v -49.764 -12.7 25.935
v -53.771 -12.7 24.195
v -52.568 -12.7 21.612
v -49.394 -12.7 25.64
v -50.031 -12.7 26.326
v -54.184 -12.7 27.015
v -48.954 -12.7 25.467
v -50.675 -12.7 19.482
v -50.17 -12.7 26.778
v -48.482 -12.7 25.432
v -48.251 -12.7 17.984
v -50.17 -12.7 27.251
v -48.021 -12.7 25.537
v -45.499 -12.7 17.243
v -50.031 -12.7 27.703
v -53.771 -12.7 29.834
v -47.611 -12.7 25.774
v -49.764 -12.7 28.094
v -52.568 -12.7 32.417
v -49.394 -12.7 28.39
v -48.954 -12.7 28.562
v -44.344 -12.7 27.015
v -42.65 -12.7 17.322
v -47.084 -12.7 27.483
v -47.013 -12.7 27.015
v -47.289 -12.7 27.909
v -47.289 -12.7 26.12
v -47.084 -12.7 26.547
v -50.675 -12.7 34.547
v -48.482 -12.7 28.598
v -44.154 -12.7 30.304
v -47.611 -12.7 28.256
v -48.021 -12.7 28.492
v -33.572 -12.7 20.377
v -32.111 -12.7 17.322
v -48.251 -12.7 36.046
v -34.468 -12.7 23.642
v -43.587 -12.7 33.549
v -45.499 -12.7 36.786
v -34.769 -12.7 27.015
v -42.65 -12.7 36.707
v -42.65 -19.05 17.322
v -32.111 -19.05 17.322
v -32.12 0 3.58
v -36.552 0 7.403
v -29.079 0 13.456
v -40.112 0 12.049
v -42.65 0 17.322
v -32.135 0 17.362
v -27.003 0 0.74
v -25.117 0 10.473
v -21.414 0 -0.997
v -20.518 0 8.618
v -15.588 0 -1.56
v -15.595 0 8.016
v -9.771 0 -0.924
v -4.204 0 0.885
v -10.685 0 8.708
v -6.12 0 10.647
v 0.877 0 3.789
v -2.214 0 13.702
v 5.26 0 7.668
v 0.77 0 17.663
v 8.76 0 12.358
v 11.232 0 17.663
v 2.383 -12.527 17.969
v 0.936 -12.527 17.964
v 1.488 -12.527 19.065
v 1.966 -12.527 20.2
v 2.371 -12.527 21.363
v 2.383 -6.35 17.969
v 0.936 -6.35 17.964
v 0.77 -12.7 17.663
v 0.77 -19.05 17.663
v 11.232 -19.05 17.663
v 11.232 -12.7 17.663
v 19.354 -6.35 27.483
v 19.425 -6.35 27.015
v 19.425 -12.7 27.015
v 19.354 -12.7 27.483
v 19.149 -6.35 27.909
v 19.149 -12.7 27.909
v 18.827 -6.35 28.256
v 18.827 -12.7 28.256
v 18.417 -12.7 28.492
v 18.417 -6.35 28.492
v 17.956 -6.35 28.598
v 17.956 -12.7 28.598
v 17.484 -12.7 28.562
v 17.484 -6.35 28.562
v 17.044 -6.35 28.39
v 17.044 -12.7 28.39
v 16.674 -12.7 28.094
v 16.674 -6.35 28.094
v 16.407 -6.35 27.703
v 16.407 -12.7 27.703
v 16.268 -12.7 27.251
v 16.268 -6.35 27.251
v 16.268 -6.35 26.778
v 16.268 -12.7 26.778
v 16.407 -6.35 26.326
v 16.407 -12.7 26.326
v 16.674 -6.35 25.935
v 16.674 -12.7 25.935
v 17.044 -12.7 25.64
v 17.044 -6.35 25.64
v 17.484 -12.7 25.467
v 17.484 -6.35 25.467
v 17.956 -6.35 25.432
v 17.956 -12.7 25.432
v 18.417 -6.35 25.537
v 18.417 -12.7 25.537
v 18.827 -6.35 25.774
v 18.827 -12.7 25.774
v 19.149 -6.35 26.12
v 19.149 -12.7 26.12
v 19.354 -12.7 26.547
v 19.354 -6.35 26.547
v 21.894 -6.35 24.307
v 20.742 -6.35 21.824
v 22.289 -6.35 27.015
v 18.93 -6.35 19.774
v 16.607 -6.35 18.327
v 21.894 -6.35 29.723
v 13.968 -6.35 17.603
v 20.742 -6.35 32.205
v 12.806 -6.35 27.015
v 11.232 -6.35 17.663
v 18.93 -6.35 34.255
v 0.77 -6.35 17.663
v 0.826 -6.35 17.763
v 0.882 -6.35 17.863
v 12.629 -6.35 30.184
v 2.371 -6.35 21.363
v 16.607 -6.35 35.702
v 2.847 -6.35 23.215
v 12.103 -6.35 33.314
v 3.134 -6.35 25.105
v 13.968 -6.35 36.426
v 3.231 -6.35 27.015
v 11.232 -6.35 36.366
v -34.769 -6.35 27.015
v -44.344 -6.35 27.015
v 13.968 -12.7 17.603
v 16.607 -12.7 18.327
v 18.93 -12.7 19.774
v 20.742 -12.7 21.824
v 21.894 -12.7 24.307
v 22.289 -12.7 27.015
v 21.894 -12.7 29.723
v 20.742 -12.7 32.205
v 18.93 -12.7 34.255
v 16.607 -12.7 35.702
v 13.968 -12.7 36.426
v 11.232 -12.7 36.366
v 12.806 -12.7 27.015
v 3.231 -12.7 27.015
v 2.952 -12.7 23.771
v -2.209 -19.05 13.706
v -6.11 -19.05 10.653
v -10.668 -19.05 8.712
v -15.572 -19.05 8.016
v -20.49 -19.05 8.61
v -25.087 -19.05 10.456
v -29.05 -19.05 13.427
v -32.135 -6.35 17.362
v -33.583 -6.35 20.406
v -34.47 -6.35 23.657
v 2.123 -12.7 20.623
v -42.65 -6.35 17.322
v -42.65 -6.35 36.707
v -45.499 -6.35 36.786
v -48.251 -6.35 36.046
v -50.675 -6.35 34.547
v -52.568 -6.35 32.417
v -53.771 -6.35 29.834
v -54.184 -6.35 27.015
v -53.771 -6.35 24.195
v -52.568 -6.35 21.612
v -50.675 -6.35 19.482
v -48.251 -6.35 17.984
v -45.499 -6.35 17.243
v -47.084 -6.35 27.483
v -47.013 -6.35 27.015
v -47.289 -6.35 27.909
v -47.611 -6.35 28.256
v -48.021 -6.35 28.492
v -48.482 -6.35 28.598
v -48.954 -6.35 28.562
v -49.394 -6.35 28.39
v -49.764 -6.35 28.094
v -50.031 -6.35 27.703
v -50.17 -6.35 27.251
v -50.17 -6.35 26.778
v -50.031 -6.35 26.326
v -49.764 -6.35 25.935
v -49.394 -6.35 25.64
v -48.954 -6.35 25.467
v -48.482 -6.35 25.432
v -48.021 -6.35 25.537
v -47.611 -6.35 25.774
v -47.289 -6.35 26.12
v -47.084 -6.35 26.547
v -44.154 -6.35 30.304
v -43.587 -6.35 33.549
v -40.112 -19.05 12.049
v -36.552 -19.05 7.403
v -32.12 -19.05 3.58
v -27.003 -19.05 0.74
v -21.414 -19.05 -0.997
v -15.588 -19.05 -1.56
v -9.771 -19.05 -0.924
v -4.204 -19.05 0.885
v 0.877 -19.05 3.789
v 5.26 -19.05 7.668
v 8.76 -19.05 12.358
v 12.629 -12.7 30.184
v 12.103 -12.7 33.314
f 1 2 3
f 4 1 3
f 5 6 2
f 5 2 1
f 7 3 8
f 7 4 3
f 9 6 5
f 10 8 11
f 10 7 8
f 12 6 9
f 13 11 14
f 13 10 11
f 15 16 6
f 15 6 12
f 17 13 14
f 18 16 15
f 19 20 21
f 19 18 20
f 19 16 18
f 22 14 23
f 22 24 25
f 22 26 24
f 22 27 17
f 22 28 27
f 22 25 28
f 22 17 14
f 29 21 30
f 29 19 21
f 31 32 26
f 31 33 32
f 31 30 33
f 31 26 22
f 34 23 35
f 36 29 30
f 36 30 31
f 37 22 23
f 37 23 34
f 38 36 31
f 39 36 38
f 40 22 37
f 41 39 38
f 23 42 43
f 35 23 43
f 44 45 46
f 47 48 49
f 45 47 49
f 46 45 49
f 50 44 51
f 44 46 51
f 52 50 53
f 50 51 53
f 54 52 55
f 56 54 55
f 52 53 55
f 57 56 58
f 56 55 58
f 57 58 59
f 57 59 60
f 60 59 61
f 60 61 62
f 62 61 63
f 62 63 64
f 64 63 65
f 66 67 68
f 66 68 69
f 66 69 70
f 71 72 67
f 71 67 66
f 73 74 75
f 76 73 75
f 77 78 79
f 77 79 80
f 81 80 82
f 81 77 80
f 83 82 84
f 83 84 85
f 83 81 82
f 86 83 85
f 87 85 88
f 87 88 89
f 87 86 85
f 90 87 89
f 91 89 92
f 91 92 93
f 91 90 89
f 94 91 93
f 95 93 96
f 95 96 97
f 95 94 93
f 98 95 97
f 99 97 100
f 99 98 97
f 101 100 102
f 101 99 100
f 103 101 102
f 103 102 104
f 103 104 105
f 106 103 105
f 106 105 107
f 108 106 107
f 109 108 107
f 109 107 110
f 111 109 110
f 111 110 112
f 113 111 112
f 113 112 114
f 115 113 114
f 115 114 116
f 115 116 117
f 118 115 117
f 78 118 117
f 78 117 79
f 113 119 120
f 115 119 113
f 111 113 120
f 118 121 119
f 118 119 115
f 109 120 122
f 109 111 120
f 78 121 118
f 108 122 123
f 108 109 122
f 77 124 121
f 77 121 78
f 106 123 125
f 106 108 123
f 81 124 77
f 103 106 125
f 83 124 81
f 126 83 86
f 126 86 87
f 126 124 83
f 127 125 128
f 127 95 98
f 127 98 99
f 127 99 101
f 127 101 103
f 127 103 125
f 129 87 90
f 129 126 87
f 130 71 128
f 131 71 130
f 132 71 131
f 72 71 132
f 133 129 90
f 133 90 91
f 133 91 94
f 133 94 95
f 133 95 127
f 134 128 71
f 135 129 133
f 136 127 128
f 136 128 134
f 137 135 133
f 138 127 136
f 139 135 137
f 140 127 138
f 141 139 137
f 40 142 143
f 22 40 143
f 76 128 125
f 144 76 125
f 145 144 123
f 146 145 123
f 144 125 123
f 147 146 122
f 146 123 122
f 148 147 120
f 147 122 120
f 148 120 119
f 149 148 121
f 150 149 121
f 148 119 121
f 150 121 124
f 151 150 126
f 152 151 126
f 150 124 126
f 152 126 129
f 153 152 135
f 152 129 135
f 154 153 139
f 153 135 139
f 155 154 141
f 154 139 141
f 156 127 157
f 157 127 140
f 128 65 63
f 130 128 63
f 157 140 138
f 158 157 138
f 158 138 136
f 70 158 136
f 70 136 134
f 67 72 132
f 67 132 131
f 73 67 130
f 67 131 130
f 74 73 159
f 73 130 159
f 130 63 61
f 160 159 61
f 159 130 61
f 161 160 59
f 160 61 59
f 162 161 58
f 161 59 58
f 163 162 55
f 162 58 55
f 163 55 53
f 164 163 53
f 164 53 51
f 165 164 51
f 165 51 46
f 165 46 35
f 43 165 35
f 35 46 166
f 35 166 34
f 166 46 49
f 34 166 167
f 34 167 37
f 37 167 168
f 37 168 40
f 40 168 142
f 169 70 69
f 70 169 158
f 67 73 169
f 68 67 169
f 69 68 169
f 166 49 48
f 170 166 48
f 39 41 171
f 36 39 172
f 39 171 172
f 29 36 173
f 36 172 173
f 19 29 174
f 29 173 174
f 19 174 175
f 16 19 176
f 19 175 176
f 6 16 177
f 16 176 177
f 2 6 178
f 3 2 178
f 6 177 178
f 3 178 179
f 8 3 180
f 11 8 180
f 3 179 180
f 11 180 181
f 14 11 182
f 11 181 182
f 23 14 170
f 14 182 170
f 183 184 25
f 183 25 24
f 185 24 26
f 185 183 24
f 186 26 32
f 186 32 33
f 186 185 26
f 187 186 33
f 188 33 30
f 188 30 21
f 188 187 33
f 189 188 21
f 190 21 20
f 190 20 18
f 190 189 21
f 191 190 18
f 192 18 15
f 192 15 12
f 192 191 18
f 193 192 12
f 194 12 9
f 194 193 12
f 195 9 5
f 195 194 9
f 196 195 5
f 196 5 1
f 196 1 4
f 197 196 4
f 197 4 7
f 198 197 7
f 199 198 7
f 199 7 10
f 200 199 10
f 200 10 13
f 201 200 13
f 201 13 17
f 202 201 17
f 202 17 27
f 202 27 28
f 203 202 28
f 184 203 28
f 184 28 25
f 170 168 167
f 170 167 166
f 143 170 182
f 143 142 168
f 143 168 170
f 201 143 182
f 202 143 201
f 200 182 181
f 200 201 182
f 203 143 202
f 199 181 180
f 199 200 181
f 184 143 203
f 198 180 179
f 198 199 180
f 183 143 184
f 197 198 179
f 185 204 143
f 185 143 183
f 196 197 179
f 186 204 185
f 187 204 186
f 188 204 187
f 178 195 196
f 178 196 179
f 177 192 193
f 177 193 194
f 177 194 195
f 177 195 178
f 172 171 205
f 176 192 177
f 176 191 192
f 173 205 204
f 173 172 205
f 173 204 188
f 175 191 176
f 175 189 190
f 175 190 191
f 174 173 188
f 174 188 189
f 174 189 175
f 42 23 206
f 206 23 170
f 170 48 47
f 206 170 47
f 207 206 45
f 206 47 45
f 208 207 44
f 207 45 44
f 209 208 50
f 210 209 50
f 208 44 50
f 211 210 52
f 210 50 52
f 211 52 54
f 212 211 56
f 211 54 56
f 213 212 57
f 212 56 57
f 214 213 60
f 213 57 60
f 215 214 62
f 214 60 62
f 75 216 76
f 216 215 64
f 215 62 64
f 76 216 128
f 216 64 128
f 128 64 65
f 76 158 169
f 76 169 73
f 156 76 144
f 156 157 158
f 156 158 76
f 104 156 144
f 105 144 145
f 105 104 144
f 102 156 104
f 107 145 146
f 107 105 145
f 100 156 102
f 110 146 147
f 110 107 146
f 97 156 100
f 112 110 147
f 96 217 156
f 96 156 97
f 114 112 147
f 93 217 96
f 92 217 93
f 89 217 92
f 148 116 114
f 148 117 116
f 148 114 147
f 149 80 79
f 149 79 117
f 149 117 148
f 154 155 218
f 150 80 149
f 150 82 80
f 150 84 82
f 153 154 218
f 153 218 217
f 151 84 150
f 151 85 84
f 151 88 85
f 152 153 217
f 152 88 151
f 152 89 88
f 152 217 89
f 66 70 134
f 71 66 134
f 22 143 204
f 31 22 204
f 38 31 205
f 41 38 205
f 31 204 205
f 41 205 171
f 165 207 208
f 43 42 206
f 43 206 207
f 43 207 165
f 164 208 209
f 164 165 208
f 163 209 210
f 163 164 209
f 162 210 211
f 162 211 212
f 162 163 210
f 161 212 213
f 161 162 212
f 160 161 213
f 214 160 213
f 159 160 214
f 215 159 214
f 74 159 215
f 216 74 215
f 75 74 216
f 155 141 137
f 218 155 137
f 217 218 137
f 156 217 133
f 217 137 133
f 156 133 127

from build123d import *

# Parameters (mm, degrees)
F0_R     = 1.5875
F1_DEPTH = 19.05
F2_R     = 1.5875
F3_DEPTH = 6.35
F4_R     = 1.5875
F5_DEPTH = 6.35
F8_DEPTH = 151.92272


with BuildPart() as f1:
    # F0 (on Front) → F1 (new body)
    with BuildSketch(Plane.XZ):
        with BuildLine():
            ThreePointArc((3.2306237647, 27.0146857947), (-15.7693382353, 8.0147237947), (-34.7693002353, 27.0146857947))
            Line((-34.7693002353, 27.0146857947), (-44.3443382353, 27.0146857947))
            ThreePointArc((-44.3443382353, 27.0146857947), (-43.9176321109, 31.9344598635), (-42.6502576132, 36.7073014581))
            ThreePointArc((-42.6502576132, 36.7073014581), (-54.1838863729, 27.0146857947), (-42.6502576132, 17.3220701313))
            ThreePointArc((-42.6502576132, 17.3220701313), (-15.5884947503, -1.5597419447), (11.2321092838, 17.6630839601))
            ThreePointArc((11.2321092838, 17.6630839601), (22.288726896, 27.0146857947), (11.2321092838, 36.3662876293))
            ThreePointArc((11.2321092838, 36.3662876293), (12.4095278514, 31.7562183603), (12.8056617647, 27.0146857947))
            Line((12.8056617647, 27.0146857947), (3.2306237647, 27.0146857947))
        make_face()
        with Locations((-48.6005805433, 27.0146857947)):
            Circle(F0_R, mode=Mode.SUBTRACT)
        with Locations((17.8374499083, 27.0146857947)):
            Circle(F0_R, mode=Mode.SUBTRACT)
    extrude(amount=F1_DEPTH)

    # F2 (on face) → F3 (cut)
    with BuildSketch(Plane.XZ.offset(19.05)):
        with BuildLine():
            ThreePointArc((-42.6502576132, 36.7073014581), (-54.1838863729, 27.0146857947), (-42.6502576132, 17.3220701313))
            Line((-42.6502576132, 17.3220701313), (-32.1110565538, 17.3220701313))
            ThreePointArc((-32.1110565538, 17.3220701313), (-34.0926919549, 21.989423168), (-34.7693002353, 27.0146857947))
            Line((-34.7693002353, 27.0146857947), (-44.3443382353, 27.0146857947))
            ThreePointArc((-44.3443382353, 27.0146857947), (-43.9176321109, 31.9344598635), (-42.6502576132, 36.7073014581))
        make_face()
        with Locations((-48.6005805433, 27.0146857947)):
            Circle(F2_R, mode=Mode.SUBTRACT)
        with BuildLine():
            Line((0.7698908619, 17.6630839601), (11.2321092838, 17.6630839601))
            ThreePointArc((11.2321092838, 17.6630839601), (22.288726896, 27.0146857947), (11.2321092838, 36.3662876293))
            ThreePointArc((11.2321092838, 36.3662876293), (12.4095278514, 31.7562183603), (12.8056617647, 27.0146857947))
            Line((12.8056617647, 27.0146857947), (3.2306237647, 27.0146857947))
            ThreePointArc((3.2306237647, 27.0146857947), (2.6051451637, 22.1797177676), (0.7698908619, 17.6630839601))
        make_face()
        with Locations((17.8374499083, 27.0146857947)):
            Circle(F2_R, mode=Mode.SUBTRACT)
    extrude(amount=-F3_DEPTH, mode=Mode.SUBTRACT)

    # F4 (on face) → F5 (cut)
    with BuildSketch(Plane(origin=(0, 0, 0), x_dir=(-1, 0, 0), z_dir=(0, 1, 0))):
        with BuildLine():
            ThreePointArc((-11.2321092838, 36.3662876293), (-22.288726896, 27.0146857947), (-11.2321092838, 17.6630839601))
            Line((-11.2321092838, 17.6630839601), (-0.7698908619, 17.6630839601))
            ThreePointArc((-0.7698908619, 17.6630839601), (-2.6051451637, 22.1797177676), (-3.2306237647, 27.0146857947))
            Line((-3.2306237647, 27.0146857947), (-12.8056617647, 27.0146857947))
            ThreePointArc((-12.8056617647, 27.0146857947), (-12.4095278514, 31.7562183603), (-11.2321092838, 36.3662876293))
        make_face()
        with Locations((-17.8374499083, 27.0146857947)):
            Circle(F4_R, mode=Mode.SUBTRACT)
        with BuildLine():
            Line((32.134551767, 17.3617928572), (42.6502576132, 17.3220701313))
            ThreePointArc((42.6502576132, 17.3220701313), (54.1838863729, 27.0146857947), (42.6502576132, 36.7073014581))
            ThreePointArc((42.6502576132, 36.7073014581), (43.9176321109, 31.9344598635), (44.3443382353, 27.0146857947))
            Line((44.3443382353, 27.0146857947), (34.7693002353, 27.0146857947))
            ThreePointArc((34.7693002353, 27.0146857947), (34.0987816423, 22.011680659), (32.134551767, 17.3617928572))
        make_face()
        with Locations((48.6005805433, 27.0146857947)):
            Circle(F4_R, mode=Mode.SUBTRACT)
    extrude(amount=-F5_DEPTH, mode=Mode.SUBTRACT)

    # F7 (on offset) → F8 (cut)
    with BuildSketch(Plane(origin=(-0.6417229615, 0, 169.8818432743), x_dir=(0.9999928655, 0, 0.0037774395), z_dir=(-0.0037774395, 0, 0.9999928655))):
        Polygon((2.4513369426, -5.8165588416), (-31.672719866, -5.8165588416), (-31.3653349876, -12.5274714082), (2.4513369426, -12.5274714082), align=None)
    extrude(amount=-F8_DEPTH, mode=Mode.SUBTRACT)


solid = f1.part
